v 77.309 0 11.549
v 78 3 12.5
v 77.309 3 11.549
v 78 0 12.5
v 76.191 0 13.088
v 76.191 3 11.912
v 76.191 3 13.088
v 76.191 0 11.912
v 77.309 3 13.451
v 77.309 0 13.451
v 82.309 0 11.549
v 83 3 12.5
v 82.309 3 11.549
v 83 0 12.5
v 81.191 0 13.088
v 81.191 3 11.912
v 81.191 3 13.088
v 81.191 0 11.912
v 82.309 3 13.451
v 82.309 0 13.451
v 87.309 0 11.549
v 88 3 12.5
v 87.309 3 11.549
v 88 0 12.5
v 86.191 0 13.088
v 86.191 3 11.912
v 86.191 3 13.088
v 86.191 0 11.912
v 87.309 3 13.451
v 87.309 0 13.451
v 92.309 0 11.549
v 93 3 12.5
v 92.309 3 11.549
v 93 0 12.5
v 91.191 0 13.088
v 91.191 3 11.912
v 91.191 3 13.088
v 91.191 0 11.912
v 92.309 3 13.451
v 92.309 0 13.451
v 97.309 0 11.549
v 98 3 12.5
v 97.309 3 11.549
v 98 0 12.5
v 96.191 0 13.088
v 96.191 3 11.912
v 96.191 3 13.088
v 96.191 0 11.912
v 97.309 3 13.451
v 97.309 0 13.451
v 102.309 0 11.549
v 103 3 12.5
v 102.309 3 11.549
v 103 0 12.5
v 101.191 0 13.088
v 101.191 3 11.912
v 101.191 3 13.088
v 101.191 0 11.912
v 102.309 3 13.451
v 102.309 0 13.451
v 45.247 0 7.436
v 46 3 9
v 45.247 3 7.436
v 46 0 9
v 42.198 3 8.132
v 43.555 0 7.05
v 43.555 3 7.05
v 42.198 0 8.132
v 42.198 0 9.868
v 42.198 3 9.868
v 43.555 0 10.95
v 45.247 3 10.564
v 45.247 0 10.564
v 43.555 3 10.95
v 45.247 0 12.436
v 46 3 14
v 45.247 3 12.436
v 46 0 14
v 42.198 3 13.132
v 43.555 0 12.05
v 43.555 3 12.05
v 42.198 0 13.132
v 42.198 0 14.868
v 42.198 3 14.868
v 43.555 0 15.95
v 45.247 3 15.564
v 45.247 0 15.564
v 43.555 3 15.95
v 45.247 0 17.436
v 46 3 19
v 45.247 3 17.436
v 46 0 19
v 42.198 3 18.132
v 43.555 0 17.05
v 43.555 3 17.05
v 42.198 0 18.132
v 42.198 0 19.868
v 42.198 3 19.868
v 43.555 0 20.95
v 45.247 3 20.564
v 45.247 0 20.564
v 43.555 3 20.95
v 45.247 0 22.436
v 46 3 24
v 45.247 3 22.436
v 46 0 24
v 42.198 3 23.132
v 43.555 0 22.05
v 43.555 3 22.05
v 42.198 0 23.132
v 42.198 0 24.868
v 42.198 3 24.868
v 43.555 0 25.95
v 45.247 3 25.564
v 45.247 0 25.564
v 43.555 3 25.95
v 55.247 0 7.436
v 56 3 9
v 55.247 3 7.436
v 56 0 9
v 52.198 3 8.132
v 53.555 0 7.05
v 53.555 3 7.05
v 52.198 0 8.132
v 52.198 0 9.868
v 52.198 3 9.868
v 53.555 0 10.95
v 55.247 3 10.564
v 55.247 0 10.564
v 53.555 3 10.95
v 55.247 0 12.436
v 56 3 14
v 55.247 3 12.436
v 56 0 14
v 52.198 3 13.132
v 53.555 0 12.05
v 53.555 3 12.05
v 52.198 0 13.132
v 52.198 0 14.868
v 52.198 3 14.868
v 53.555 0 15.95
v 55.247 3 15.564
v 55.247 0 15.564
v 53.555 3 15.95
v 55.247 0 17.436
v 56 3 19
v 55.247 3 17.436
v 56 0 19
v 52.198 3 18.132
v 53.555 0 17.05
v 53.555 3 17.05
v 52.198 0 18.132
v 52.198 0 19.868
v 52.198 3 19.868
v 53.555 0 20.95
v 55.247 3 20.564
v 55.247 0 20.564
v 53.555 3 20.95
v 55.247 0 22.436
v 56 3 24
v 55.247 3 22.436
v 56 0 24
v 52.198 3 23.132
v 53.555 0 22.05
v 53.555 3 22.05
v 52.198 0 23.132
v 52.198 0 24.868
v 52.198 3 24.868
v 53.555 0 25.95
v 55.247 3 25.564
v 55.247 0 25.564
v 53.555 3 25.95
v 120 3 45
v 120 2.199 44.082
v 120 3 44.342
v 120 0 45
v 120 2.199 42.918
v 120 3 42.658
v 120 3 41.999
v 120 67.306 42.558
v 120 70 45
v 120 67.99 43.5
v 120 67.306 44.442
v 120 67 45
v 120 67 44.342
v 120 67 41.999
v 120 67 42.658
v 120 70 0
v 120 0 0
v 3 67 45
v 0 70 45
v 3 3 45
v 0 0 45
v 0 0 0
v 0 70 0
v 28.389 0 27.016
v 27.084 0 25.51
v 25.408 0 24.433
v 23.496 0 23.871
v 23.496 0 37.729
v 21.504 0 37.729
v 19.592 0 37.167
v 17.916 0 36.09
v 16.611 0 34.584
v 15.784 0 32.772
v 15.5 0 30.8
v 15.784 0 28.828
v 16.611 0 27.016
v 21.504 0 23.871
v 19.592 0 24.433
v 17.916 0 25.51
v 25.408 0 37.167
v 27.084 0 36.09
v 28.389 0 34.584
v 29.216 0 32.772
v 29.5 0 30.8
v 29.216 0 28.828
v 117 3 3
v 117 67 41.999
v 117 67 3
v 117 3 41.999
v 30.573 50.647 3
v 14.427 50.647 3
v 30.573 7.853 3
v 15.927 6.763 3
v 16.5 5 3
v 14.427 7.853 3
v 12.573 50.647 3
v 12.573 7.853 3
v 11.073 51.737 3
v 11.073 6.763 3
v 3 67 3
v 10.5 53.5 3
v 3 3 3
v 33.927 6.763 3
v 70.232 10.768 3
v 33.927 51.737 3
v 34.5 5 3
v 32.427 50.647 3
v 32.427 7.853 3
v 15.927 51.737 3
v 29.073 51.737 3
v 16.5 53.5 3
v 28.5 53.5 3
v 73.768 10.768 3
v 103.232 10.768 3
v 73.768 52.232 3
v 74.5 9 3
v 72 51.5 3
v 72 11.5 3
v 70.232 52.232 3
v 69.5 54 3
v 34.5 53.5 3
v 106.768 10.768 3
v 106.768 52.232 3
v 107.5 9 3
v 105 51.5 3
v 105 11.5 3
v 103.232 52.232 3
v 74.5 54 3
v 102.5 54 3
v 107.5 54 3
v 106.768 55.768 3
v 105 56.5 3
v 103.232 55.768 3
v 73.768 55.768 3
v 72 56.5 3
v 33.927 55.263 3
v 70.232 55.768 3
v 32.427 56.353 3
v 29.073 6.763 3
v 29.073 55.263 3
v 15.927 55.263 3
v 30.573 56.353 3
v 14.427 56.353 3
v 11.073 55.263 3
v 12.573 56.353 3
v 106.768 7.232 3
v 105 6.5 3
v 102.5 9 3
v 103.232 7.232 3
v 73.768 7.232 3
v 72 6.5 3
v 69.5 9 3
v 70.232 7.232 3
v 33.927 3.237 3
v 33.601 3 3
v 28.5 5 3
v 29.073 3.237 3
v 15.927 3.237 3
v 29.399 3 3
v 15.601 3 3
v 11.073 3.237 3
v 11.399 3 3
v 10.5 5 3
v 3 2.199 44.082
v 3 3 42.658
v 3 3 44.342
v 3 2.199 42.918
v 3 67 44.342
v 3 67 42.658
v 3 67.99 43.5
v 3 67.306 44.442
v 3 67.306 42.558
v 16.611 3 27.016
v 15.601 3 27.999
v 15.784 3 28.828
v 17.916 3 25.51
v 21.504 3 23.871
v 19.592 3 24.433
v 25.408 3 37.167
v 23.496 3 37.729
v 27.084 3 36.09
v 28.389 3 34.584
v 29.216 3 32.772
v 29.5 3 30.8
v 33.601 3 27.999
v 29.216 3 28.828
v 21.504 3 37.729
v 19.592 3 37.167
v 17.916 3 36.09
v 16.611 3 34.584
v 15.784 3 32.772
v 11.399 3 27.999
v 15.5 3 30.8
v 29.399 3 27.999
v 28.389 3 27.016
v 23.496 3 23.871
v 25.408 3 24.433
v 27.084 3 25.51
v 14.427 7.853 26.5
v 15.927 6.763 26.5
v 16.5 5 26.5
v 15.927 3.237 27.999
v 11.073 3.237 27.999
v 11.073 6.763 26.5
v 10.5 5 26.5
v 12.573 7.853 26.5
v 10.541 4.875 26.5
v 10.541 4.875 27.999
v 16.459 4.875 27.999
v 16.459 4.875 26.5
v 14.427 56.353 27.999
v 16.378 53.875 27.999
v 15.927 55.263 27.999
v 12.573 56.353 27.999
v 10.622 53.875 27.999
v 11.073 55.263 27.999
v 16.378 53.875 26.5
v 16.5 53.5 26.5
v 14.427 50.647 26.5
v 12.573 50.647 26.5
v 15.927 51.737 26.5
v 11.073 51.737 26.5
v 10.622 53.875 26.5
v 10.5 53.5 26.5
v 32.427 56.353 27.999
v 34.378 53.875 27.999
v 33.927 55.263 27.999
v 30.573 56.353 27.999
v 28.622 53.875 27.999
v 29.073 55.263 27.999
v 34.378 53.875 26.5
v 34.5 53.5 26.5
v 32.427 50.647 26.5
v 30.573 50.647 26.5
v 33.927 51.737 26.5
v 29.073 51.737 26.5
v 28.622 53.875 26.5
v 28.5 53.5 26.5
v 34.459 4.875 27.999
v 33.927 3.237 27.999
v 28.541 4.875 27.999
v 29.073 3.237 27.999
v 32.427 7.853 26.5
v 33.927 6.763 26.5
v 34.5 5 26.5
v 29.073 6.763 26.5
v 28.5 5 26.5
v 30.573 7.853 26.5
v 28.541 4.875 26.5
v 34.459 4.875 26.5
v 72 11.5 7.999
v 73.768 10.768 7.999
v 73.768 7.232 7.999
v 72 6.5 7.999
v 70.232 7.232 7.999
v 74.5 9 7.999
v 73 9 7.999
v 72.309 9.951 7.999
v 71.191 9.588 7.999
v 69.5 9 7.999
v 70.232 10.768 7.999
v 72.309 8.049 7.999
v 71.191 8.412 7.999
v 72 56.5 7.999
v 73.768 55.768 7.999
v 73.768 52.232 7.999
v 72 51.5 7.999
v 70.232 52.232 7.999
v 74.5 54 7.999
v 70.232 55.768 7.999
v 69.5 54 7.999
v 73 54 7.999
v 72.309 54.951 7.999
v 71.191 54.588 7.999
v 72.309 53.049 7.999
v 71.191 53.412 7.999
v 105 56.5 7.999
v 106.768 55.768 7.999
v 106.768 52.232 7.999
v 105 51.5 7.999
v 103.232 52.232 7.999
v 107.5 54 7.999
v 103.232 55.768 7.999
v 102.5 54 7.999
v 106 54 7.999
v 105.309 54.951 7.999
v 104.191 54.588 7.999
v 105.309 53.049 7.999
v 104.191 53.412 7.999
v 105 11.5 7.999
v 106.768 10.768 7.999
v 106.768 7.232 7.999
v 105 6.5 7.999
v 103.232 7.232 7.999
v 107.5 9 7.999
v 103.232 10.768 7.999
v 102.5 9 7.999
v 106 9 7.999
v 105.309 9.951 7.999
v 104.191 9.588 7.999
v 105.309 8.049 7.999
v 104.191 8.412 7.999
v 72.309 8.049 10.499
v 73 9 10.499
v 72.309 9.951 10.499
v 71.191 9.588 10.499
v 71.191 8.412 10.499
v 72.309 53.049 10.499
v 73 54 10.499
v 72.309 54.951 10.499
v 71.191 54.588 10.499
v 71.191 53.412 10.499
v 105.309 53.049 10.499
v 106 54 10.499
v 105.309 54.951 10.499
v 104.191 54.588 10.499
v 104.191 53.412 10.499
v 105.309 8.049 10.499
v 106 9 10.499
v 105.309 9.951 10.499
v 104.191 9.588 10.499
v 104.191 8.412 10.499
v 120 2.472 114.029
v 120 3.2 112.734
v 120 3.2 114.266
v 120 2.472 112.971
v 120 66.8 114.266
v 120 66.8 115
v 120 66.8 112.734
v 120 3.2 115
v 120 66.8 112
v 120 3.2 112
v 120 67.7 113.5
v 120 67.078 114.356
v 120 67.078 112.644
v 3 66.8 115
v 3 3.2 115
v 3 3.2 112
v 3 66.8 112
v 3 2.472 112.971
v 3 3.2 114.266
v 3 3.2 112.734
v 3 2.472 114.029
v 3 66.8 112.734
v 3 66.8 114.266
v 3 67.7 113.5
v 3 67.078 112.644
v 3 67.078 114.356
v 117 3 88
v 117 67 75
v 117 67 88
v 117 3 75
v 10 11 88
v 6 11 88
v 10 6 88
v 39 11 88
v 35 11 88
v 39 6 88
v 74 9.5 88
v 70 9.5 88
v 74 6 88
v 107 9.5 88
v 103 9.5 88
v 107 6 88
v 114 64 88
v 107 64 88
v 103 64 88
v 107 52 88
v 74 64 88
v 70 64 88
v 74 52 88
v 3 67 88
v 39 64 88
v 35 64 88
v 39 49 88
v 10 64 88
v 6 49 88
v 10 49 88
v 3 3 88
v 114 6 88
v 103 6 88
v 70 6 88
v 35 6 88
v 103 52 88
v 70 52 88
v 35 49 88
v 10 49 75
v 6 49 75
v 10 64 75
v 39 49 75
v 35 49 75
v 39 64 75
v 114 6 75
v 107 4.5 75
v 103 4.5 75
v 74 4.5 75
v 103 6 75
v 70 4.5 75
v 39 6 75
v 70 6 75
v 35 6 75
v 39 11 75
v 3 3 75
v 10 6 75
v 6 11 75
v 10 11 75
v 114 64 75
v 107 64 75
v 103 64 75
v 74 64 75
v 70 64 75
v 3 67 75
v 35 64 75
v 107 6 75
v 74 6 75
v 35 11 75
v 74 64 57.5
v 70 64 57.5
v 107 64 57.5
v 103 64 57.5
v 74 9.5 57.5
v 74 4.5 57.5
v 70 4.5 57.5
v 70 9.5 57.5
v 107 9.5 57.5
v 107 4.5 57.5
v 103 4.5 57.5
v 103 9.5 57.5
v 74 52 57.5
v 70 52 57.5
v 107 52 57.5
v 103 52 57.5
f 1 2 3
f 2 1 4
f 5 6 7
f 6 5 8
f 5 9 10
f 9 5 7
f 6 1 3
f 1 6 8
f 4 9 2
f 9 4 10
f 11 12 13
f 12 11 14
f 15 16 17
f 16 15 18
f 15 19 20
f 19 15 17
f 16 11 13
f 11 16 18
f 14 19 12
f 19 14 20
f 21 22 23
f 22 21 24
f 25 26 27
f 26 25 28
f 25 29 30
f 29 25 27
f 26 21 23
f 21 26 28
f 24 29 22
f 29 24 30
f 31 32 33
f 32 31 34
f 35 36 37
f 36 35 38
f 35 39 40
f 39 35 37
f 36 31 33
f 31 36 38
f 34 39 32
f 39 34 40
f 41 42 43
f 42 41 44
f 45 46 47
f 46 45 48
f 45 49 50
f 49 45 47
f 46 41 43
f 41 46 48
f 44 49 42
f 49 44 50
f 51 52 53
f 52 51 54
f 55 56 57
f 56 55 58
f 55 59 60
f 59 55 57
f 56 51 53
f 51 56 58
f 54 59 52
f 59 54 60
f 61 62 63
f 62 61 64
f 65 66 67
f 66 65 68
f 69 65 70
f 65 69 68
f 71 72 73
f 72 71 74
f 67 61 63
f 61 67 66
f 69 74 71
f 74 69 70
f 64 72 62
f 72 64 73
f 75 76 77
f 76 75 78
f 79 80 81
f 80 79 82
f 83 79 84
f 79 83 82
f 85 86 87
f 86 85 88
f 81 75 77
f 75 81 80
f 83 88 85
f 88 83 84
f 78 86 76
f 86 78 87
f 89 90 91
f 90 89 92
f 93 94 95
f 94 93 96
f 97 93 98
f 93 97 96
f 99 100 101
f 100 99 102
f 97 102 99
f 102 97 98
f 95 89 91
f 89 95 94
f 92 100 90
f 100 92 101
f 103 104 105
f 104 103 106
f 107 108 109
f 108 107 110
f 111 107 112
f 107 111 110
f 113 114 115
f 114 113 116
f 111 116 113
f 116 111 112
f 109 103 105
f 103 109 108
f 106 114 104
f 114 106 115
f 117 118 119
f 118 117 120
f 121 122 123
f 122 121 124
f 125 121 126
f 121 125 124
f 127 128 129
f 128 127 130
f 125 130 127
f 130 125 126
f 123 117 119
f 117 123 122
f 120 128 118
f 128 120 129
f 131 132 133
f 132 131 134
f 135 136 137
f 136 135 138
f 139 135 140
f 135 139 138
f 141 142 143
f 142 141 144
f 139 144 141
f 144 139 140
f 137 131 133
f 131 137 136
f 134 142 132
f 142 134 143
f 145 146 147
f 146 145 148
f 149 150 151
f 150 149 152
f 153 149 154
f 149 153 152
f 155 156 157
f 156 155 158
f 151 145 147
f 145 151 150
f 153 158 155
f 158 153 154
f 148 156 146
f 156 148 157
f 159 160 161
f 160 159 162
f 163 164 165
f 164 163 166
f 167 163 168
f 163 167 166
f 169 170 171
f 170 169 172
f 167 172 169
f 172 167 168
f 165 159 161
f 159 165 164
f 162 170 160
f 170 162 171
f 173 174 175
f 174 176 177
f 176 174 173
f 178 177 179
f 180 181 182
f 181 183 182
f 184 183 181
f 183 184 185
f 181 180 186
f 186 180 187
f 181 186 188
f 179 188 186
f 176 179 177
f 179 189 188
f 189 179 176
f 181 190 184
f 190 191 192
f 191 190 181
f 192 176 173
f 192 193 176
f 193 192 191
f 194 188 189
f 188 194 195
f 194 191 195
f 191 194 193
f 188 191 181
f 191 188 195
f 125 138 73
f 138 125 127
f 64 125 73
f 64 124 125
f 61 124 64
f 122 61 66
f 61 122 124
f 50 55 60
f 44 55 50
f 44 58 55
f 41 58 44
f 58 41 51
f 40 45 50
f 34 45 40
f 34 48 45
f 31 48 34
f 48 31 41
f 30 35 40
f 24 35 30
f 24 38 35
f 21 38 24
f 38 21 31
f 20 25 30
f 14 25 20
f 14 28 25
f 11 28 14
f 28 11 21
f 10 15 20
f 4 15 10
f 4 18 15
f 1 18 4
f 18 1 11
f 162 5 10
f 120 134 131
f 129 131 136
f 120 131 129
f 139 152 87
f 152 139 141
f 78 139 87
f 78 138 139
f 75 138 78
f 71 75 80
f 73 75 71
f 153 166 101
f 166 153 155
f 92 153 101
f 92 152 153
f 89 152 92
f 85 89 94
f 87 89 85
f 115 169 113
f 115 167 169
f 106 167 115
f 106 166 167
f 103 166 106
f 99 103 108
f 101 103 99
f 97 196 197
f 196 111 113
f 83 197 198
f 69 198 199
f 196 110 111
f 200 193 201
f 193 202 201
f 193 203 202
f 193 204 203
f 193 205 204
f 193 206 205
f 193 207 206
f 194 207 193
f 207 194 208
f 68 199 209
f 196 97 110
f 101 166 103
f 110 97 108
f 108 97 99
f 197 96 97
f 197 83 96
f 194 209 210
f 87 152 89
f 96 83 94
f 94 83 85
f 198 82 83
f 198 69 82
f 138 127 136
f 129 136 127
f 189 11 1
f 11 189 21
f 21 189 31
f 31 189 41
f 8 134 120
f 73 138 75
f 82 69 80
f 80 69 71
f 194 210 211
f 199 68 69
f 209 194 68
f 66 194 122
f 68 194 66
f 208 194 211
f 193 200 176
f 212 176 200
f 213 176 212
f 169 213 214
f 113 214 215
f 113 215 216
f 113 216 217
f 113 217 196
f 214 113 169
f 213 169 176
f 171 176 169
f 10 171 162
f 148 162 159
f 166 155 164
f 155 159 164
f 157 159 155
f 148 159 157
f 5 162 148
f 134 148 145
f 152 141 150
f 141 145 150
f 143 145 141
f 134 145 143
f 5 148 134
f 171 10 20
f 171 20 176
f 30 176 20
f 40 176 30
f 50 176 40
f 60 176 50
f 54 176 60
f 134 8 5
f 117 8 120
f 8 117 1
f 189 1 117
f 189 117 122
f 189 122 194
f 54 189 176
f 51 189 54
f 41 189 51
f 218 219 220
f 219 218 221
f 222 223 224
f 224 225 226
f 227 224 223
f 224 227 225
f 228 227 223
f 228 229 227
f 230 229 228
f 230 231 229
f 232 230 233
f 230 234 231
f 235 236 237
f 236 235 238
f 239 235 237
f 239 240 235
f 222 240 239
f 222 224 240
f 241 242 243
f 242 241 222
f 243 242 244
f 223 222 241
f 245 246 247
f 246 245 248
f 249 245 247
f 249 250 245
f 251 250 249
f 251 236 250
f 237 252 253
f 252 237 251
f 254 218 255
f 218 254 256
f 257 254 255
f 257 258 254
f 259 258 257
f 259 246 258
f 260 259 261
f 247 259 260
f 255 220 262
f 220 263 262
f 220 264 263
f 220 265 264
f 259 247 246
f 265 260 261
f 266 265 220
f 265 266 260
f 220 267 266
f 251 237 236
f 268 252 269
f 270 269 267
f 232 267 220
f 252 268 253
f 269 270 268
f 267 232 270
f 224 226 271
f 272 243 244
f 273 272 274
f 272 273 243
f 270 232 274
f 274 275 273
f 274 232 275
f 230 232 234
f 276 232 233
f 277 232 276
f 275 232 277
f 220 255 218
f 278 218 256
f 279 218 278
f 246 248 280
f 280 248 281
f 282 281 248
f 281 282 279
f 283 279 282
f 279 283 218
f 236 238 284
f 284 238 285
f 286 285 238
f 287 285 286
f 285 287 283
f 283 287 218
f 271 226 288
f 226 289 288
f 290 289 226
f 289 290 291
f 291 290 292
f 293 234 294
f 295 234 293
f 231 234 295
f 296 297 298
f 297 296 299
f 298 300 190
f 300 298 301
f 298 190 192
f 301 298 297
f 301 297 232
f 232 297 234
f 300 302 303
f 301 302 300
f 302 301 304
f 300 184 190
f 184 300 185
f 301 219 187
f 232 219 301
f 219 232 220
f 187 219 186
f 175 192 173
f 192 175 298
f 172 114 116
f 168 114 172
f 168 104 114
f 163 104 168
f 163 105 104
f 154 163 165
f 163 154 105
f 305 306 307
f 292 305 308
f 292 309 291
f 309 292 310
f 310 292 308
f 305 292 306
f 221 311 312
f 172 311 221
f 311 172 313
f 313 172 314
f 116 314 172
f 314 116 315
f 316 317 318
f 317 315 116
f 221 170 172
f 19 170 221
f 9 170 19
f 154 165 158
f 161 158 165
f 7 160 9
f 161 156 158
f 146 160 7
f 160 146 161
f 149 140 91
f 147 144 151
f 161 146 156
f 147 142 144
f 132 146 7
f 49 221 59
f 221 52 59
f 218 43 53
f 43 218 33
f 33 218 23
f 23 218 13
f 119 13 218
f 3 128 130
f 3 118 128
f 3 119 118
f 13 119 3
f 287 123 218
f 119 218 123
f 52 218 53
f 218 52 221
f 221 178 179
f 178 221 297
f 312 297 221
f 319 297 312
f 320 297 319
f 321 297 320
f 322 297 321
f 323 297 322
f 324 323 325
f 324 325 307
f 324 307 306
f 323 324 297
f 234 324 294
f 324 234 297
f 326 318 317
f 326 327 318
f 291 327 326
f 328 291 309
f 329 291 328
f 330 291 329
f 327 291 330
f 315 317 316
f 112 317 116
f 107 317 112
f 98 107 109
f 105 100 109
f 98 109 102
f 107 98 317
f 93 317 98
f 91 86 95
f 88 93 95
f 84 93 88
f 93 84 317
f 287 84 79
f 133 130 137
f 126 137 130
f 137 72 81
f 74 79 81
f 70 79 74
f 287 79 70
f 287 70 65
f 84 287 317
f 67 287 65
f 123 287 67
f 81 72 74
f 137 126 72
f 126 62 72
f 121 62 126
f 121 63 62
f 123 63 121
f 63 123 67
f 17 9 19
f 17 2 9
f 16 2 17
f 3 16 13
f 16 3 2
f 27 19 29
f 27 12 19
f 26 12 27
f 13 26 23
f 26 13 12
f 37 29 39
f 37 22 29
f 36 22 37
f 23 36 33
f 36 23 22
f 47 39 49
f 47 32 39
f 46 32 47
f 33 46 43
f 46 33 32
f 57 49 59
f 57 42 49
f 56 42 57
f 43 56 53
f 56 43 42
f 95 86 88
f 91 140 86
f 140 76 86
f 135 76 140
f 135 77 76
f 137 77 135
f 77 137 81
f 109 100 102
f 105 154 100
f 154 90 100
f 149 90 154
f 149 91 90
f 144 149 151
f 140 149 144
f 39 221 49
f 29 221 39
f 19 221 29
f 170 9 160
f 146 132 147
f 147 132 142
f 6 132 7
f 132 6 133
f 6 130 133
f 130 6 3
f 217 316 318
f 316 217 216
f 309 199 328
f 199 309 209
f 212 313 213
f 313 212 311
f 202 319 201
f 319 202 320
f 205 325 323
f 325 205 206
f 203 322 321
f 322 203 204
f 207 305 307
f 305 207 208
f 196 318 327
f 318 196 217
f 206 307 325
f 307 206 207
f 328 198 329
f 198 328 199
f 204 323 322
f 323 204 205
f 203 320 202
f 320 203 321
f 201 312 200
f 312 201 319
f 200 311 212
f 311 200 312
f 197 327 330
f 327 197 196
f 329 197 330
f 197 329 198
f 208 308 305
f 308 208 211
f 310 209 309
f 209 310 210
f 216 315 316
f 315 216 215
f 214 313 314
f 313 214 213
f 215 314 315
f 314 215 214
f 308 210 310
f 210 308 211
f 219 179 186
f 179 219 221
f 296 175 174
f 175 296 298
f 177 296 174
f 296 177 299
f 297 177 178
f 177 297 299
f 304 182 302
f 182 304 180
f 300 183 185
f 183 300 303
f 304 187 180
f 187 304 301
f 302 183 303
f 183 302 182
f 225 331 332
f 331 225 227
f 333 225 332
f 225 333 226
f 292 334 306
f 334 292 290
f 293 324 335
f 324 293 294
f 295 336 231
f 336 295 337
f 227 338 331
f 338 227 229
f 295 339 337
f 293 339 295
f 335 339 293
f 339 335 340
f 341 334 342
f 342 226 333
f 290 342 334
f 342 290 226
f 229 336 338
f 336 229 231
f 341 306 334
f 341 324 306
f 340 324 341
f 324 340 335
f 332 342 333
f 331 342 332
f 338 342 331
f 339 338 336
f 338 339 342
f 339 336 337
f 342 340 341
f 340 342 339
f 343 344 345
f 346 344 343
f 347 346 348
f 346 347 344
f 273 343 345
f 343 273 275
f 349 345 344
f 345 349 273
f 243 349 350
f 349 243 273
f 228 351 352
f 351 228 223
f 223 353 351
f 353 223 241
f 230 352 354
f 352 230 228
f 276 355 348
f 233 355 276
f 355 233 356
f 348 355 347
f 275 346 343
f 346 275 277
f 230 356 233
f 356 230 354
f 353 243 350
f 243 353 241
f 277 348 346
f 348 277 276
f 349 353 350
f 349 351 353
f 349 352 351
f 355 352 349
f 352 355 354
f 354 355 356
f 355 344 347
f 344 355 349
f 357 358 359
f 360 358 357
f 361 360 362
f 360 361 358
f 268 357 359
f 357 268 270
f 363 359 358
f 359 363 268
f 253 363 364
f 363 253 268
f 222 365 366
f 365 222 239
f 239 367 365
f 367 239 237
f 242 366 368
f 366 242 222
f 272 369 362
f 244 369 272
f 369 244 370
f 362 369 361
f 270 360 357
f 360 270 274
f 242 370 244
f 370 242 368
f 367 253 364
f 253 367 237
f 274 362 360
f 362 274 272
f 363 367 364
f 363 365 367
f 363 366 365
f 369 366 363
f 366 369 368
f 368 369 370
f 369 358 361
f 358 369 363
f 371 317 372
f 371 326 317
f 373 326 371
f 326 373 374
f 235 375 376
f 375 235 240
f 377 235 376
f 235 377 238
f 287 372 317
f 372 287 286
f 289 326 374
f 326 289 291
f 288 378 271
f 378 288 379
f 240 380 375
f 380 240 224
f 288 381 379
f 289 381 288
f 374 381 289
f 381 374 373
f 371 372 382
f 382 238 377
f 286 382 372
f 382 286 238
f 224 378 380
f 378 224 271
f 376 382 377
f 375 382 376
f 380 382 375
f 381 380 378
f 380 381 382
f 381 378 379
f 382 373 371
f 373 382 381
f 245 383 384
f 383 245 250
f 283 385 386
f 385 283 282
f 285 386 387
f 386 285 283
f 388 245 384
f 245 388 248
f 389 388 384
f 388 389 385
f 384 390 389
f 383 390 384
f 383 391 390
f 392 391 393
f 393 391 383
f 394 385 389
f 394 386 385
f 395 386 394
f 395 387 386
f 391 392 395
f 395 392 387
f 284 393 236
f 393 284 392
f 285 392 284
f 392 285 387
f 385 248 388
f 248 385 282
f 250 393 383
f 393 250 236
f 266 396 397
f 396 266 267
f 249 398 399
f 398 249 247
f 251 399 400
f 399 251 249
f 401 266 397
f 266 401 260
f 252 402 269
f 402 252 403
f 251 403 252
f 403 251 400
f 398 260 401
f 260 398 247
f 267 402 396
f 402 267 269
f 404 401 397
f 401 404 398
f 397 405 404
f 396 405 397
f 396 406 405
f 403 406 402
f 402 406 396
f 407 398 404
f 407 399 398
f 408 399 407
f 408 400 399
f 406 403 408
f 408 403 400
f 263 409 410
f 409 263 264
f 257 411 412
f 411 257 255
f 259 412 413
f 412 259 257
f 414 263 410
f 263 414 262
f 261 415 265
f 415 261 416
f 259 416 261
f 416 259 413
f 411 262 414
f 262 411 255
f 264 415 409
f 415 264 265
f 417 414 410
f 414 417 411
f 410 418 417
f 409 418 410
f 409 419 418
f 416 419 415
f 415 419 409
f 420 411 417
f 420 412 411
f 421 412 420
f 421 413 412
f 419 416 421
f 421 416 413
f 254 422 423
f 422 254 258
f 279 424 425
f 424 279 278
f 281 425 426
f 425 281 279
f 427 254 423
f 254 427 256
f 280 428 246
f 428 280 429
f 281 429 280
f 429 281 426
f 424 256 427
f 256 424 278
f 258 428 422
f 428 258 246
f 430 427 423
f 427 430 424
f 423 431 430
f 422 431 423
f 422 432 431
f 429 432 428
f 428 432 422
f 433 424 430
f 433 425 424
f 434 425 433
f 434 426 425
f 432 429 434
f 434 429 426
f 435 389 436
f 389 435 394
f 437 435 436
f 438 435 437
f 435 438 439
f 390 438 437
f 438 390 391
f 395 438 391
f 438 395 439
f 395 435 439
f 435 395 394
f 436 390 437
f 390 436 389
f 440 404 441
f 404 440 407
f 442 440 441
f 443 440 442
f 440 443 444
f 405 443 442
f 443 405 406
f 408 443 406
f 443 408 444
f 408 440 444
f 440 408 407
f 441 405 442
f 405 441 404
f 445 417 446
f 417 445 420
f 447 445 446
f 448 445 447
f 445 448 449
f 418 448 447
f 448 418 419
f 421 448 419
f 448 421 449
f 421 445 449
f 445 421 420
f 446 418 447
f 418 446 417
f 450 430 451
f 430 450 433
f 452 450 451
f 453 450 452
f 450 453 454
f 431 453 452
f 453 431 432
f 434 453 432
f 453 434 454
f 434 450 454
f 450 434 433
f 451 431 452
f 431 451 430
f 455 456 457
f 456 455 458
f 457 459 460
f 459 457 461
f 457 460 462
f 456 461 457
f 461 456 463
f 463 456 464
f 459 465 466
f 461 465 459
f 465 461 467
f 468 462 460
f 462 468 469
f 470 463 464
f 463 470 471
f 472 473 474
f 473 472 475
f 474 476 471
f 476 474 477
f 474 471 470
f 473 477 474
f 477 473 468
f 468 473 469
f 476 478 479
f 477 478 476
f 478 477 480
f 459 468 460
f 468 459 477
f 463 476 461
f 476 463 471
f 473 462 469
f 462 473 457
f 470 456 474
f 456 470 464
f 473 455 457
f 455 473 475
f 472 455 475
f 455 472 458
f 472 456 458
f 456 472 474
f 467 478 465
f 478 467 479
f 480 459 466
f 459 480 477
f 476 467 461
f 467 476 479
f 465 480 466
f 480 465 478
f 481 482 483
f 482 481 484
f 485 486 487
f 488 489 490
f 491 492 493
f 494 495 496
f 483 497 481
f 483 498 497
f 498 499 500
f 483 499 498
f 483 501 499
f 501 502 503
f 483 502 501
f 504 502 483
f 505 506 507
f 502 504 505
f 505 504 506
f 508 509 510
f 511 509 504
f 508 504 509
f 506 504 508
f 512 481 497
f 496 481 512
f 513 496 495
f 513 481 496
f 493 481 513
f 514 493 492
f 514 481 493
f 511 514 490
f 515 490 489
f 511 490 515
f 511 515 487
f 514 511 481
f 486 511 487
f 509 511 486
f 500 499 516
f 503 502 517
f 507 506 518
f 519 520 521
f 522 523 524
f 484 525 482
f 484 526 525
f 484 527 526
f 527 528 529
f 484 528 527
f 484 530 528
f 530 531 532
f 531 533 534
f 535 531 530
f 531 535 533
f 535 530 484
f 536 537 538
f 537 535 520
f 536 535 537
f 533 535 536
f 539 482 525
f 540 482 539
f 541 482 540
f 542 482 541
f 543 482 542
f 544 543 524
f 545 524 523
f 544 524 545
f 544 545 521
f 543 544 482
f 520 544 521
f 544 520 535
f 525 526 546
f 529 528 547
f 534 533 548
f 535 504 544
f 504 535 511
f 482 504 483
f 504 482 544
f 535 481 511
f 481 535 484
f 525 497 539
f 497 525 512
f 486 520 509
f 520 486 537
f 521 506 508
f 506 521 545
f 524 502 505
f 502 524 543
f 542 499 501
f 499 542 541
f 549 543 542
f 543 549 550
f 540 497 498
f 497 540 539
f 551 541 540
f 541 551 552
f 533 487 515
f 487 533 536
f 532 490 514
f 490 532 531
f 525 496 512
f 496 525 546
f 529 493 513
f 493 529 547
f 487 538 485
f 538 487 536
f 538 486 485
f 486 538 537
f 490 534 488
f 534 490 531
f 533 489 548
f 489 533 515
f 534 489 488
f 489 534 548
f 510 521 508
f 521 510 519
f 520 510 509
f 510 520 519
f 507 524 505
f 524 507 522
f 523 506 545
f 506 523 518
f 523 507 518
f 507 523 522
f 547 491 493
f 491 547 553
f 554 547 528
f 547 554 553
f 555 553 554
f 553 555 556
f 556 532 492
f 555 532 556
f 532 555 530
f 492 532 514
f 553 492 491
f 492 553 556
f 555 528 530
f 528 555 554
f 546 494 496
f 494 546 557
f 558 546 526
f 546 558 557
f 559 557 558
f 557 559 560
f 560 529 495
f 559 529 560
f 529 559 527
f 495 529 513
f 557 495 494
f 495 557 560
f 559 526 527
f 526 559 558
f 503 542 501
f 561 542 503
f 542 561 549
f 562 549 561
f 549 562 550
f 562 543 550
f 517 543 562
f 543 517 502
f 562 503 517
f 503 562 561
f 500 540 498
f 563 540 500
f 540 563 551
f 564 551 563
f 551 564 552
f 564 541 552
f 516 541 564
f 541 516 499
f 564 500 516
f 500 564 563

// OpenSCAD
//$fa = 1;
//$fs = 0.4;

J = 0.001; //offset for join
wallT = 3;
//enclosure size
enclD = 120;
enclW = 70;
enclH = 45;//2*3+35+1.5;
//percLid = 0.28; //percentage of enclosure that is the lid height
//

//Box Enclosure
module enclosure(
    wallT = 0,
    enclD = 0,
    enclW = 0,
    enclH = 0,
    slide_tol = 1.1
){
    difference(){
        cube([enclD,enclW,enclH]); 
        translate([wallT,wallT,wallT])
        cube([enclD-2*wallT,enclW-2*wallT,enclH-wallT]);
        micro_usb_plug(wallT = wallT);
        relay_wire_holes(wallT = wallT);
        signal_wire_holes(wallT = wallT);
//    };
        //cutouts for lid_slide
        translate([wallT,wallT,enclH-wallT-J])
        cube([enclD,enclW-2*wallT,wallT+2*J]);

        //groove for lid slide
        rotate([90,0,90])
        translate([wallT,enclH-0.5*wallT,wallT])
        linear_extrude(enclD+J)
        circle(wallT*0.3*slide_tol);
        
        rotate([90,0,90])
        translate([enclW-wallT,enclH-0.5*wallT,wallT])
        linear_extrude(enclD+J)
        circle(wallT*0.3*slide_tol);       
    }; 
}

module lid_slide(
    //bring in global variables
    wallT = wallT,
    enclD = enclD,
    enclW = enclD,
    enclH = enclH,
    visZ = 70,       //Move the lid up for viewing purposes
    tol = 0.2
){
    translate([wallT,wallT+tol,enclH-wallT+visZ])
    cube([enclD-wallT,enclW-2*wallT-tol*2,wallT]);
    
    rotate([90,0,90])
    translate([wallT+tol,visZ+enclH-0.5*wallT,wallT])
    linear_extrude(enclD-wallT)
    circle(wallT*0.3);
    
    rotate([90,0,90])
    translate([enclW-wallT-tol,visZ+enclH-0.5*wallT,wallT])
    linear_extrude(enclD-wallT)
    circle(wallT*0.3);
}

//PCB Supports with cutout
module pcb_supports_cutout(
    //bring in global variables
    wallT = 0,
    enclD = 0,
    enclW = 0,
    enclH = 0,

    suppR = 0,      // support post radius
    bdCa = 0,      // Clearance above board
    bdCb = 0,      // Clearance below board
    bdT = 0,        //thickness of pcb
    bdW = 0,       //board Width
    bdD = 0,       //board Depth
    pinH = 0,       //pin Height to hold board
    pinR = 0,        //pin Radius to fit in mounting hole
    //all four posts are referenced to one post near the origin
    Xoff = 0,   //reference post X offset
    Yoff = 0,    //reference post Y offset
    betweenHdr = 0,   //distance between headers
    tol = 0.5
     ){   
    difference(){
        // reference post
        translate([Xoff+bdW*0.5-betweenHdr*0.5+suppR*0.5,
                    Yoff,
                    wallT-J])
        linear_extrude(bdCb) 
        circle(suppR);
        //subtract pcb shape
        translate([Xoff,Yoff+suppR*0.125-tol,wallT+bdCb-bdT])
        cube([bdW,bdD+0.5,bdT+2*J]);
    };
    difference(){
        // distant y post
        translate([Xoff+bdW*0.5-betweenHdr*0.5+suppR*0.5,
                    bdD+Yoff,
                    wallT-J])
        linear_extrude(bdCb)
        circle(suppR);
        //subtract pcb shape
        translate([Xoff,Yoff+suppR*0.125-tol,wallT+bdCb-bdT])
        cube([bdW,bdD+0.5,bdT+2*J]);
    };
    difference(){
        // distant xy post
        translate([Xoff+bdW*0.5+betweenHdr*0.5-suppR*0.5,
                    bdD+Yoff,
                    wallT-J])
        linear_extrude(bdCb)
        circle(suppR);
        //subtract pcb shape
        translate([Xoff,Yoff+suppR*0.125-tol,wallT+bdCb-bdT])
        cube([bdW,bdD+0.5,bdT+2*J]);
    };
    difference(){
        // distant x post
        translate([Xoff+bdW*0.5+betweenHdr*0.5-suppR*0.5,
                    Yoff,
                    wallT-J])
        linear_extrude(bdCb)
        circle(suppR);
        //subtract pcb shape
        translate([Xoff,Yoff+suppR*0.125-tol,wallT+bdCb-bdT])
        cube([bdW,bdD+0.5,bdT+2*J]);
    };
        
//        translate([Xoff,Yoff+suppR*0.125,wallT+bdCb-bdT])
//        cube([bdW,bdD,bdT+J]);
}

//PCB Support with posts
//****** Bottom support posts for corners of pcb
module pcb_supports_posts(
    //bring in global variables
    wallT = 0,
    enclD = 0,
    enclW = 0,
    enclH = 0,

    suppR = 0,      // support post radius
    bdCa = 0,      // Clearance above board
    bdCb = 0,      // Clearance below board
    bdT = 0,        //thickness of pcb
    bdW = 0,       //board Width
    bdD = 0,       //board Depth
    bdWh = 0,       //board Width hole centers
    bdDh = 0,       //board Depth hole centers
    pinH = 0,       //pin Height to hold board
    pinR = 0,        //pin Radius to fit in mounting hole
    //all four posts are referenced to one post near the origin
    Xoff = 0,   //reference post X offset
    Yoff = 0    //reference post Y offset
     ){   

    // reference post
    translate([Xoff,
                Yoff,
                wallT-J])
    linear_extrude(bdCb)
    circle(suppR);
    // distant y post
    translate([Xoff,
                bdDh+Yoff,
                wallT-J])
    linear_extrude(bdCb)
    circle(suppR);
    // distant xy post
    translate([bdWh+Xoff,
                bdDh+Yoff,
                wallT-J])
    linear_extrude(bdCb)
    circle(suppR);
    // distant x post
    translate([bdWh+Xoff,
                Yoff,
                wallT-J])
    linear_extrude(bdCb)
    circle(suppR);
    
    //mounting pins to hold board in place
    // reference post
    translate([Xoff,
                Yoff,
                wallT-J+bdCb])
    linear_extrude(pinH)
    circle(pinR);
    // distant y post
    translate([Xoff,
                bdDh+Yoff,
                wallT-J+bdCb])
    linear_extrude(pinH)
    circle(pinR);
    // distant xy post
    translate([bdWh+Xoff,
                bdDh+Yoff,
                wallT-J+bdCb])
    linear_extrude(pinH)
    circle(pinR);
    // distant x post
    translate([bdWh+Xoff,
                Yoff,
                wallT-J+bdCb])
    linear_extrude(pinH)
    circle(pinR);  
   
    //View board on supports
//    translate([Xoff,Yoff,wallT+bdCb])
//    cube([bdW,bdD,bdT+J]); 
}

module micro_usb_plug(
    //bring in global variables
    wallT = wallT,
    bot_to_cent = wallT+25+1.5+2.6*0.5,    //measure bottom of enclosure to center of hole
    side_to_cent = wallT+5+29*0.5, //measure side to center of hole
    radius = 7,                 //radius of opening
){
    rotate([90,0,0])
    translate([side_to_cent,bot_to_cent,-3*wallT])
    linear_extrude(3*wallT+J)
    circle(radius);
}

module relay_wire_holes(
    //bring in global variables
    wallT = wallT,
    bot_to_cent = wallT+5+1.5+3,    //measure bottom of enclosure to center of hole
    side_to_cent = wallT+5+29+35, //measure side to center of hole
    radius = 1,                 //radius of opening
    o = 5   //offset between holes
){
    for (i=[1:6]){
    rotate([90,0,0])
    translate([o*i+side_to_cent,bot_to_cent,-2*wallT])
    linear_extrude(2*wallT+J)
    circle(radius);
    }
}

module signal_wire_holes(
    //bring in global variables
    wallT = wallT,
    bot_to_cent = wallT+1,    //measure bottom of enclosure to center of hole
    side_to_cent = wallT+5+29+7, //measure side to center of hole
    radius = 2,                 //radius of opening
    o = 5   //offset between holes
){
    for (i=[1:4]){
    rotate([90,0,0])
    translate([side_to_cent,o*i+bot_to_cent,-2*wallT])
    linear_extrude(2*wallT+J)
    circle(radius);
    }
    
    for (i=[1:4]){
    rotate([90,0,0])
    translate([10+side_to_cent,o*i+bot_to_cent,-2*wallT])
    linear_extrude(2*wallT+J)
    circle(radius);
    }
}


//PCB Clamp
module pcb_clamp(
    wallT = 0,
    enclD = 0,
    enclW = 0,
    enclH = 0,
    Height = 13,
    visZ = 30,//-17,  //Move up for viewing, down for clamp location
    W = 4   //width of cube
){
    difference(){
        translate([wallT,wallT,enclH + visZ])
        cube([enclD-2*wallT,enclW-2*wallT,Height]); 
        translate([2*wallT,2*wallT,enclH + visZ-4*J])
        cube([enclD-4*wallT,enclW-4*wallT,Height+8*J]);
        micro_usb_plug(wallT = wallT);
    };
    
    // clamps over the supports with cutouts
    //Close Y
    L1 = 5;
    translate([wallT+5-0.5*W,
                2*wallT,
               enclH + visZ])
    cube([W,L1,Height]);

    translate([wallT+5+29-0.5*W,               
                2*wallT,
                enclH + visZ])
    cube([W,L1,Height]);

    //Distant Y
    L2 = 15;
    translate([wallT+5-0.5*W,
                enclW-2*wallT-L2,
               enclH + visZ])
    cube([W,L2,Height]);

    translate([wallT+5+29-0.5*W,               
                enclW-2*wallT-L2,
                enclH + visZ])
    cube([W,L2,Height]);
    
    
    // clamps over the supports with pins
    //Close Y
    Xoff = wallT+5+29+35;
    L1p = 5;
    E = 17.5;
    translate([Xoff-0.5*W,
                1.5*wallT,
               enclH + visZ-E])
    cube([W,L1p,Height+E]);

    translate([Xoff+33-0.5*W,               
                1.5*wallT,
                enclH + visZ-E])
    cube([W,L1p,Height+E]);

    //Distant Y
    L2p = 12;
    
    translate([Xoff-0.5*W,
                enclW-2*wallT-L2p,
               enclH + visZ-E])
    cube([W,L2p,Height+E]);

    translate([Xoff+33-0.5*W,               
                enclW-2*wallT-L2p,
                enclH + visZ-E])
    cube([W,L2p,Height+E]);
    
}




// *** Instantiation of modules below *******************************
/*
ESP32 with antenna
W = 29mm
D = 49
pcb 1.5mm
above pcb clearance: give 5mm
pins below: give 10mm, with wire, give 25mm total
corner clearance: none
move pins in to center of pcb: max 10mm out from center
    stay in from ends by 10mm to clear buttons and antenna connector

Relay Board
W = 39mm
D = 51mm
pcb = 1.5mm
above pcb clearance: 16mm
below pcb 4mm
corner clearance: 5mm
*/


enclosure(
    wallT = wallT,
    enclD = enclD,
    enclW = enclW,
    enclH = enclH
);

//ESP32 PCB support
//This board does not have corner holes
//locate the support pins between the side pins
pcb_supports_cutout(
    wallT = wallT,
    Xoff = wallT+5, //reference post X offset
    Yoff = wallT+2,    //reference post Y offset
    suppR = 3,      // support post radius
    bdCa = 10,      // Clearance above board
    bdCb = 25,      // Clearance below board
    bdT = 1.5,        //thickness of pcb
    bdW = 29,       //board Width
    bdD = 48.5,       //board Depth
    betweenHdr = 21   //distance between headers
);
//Relay PCB support
pcb_supports_posts(
    wallT = wallT,
    Xoff = wallT+5+29+35,
    Yoff = wallT+6,
    suppR = 2.5,      // support post radius
    bdCa = 20,      // Clearance above board
    bdCb = 5,      // Clearance below board
    bdT = 1.5,        //thickness of pcb
    bdW = 39,       //board Width
    bdD = 51,       //board Depth
    bdWh = 33,       //board Width hole centers
    bdDh = 45,       //board Depth hole centers
    pinH = 2.5,
    pinR = 1
);

 lid_slide(
    wallT = wallT,
    enclD = enclD,
    enclW = enclW,
    enclH = enclH// * percLid
    );

pcb_clamp(
    wallT = wallT,
    enclD = enclD,
    enclW = enclW,
    enclH = enclH
);
